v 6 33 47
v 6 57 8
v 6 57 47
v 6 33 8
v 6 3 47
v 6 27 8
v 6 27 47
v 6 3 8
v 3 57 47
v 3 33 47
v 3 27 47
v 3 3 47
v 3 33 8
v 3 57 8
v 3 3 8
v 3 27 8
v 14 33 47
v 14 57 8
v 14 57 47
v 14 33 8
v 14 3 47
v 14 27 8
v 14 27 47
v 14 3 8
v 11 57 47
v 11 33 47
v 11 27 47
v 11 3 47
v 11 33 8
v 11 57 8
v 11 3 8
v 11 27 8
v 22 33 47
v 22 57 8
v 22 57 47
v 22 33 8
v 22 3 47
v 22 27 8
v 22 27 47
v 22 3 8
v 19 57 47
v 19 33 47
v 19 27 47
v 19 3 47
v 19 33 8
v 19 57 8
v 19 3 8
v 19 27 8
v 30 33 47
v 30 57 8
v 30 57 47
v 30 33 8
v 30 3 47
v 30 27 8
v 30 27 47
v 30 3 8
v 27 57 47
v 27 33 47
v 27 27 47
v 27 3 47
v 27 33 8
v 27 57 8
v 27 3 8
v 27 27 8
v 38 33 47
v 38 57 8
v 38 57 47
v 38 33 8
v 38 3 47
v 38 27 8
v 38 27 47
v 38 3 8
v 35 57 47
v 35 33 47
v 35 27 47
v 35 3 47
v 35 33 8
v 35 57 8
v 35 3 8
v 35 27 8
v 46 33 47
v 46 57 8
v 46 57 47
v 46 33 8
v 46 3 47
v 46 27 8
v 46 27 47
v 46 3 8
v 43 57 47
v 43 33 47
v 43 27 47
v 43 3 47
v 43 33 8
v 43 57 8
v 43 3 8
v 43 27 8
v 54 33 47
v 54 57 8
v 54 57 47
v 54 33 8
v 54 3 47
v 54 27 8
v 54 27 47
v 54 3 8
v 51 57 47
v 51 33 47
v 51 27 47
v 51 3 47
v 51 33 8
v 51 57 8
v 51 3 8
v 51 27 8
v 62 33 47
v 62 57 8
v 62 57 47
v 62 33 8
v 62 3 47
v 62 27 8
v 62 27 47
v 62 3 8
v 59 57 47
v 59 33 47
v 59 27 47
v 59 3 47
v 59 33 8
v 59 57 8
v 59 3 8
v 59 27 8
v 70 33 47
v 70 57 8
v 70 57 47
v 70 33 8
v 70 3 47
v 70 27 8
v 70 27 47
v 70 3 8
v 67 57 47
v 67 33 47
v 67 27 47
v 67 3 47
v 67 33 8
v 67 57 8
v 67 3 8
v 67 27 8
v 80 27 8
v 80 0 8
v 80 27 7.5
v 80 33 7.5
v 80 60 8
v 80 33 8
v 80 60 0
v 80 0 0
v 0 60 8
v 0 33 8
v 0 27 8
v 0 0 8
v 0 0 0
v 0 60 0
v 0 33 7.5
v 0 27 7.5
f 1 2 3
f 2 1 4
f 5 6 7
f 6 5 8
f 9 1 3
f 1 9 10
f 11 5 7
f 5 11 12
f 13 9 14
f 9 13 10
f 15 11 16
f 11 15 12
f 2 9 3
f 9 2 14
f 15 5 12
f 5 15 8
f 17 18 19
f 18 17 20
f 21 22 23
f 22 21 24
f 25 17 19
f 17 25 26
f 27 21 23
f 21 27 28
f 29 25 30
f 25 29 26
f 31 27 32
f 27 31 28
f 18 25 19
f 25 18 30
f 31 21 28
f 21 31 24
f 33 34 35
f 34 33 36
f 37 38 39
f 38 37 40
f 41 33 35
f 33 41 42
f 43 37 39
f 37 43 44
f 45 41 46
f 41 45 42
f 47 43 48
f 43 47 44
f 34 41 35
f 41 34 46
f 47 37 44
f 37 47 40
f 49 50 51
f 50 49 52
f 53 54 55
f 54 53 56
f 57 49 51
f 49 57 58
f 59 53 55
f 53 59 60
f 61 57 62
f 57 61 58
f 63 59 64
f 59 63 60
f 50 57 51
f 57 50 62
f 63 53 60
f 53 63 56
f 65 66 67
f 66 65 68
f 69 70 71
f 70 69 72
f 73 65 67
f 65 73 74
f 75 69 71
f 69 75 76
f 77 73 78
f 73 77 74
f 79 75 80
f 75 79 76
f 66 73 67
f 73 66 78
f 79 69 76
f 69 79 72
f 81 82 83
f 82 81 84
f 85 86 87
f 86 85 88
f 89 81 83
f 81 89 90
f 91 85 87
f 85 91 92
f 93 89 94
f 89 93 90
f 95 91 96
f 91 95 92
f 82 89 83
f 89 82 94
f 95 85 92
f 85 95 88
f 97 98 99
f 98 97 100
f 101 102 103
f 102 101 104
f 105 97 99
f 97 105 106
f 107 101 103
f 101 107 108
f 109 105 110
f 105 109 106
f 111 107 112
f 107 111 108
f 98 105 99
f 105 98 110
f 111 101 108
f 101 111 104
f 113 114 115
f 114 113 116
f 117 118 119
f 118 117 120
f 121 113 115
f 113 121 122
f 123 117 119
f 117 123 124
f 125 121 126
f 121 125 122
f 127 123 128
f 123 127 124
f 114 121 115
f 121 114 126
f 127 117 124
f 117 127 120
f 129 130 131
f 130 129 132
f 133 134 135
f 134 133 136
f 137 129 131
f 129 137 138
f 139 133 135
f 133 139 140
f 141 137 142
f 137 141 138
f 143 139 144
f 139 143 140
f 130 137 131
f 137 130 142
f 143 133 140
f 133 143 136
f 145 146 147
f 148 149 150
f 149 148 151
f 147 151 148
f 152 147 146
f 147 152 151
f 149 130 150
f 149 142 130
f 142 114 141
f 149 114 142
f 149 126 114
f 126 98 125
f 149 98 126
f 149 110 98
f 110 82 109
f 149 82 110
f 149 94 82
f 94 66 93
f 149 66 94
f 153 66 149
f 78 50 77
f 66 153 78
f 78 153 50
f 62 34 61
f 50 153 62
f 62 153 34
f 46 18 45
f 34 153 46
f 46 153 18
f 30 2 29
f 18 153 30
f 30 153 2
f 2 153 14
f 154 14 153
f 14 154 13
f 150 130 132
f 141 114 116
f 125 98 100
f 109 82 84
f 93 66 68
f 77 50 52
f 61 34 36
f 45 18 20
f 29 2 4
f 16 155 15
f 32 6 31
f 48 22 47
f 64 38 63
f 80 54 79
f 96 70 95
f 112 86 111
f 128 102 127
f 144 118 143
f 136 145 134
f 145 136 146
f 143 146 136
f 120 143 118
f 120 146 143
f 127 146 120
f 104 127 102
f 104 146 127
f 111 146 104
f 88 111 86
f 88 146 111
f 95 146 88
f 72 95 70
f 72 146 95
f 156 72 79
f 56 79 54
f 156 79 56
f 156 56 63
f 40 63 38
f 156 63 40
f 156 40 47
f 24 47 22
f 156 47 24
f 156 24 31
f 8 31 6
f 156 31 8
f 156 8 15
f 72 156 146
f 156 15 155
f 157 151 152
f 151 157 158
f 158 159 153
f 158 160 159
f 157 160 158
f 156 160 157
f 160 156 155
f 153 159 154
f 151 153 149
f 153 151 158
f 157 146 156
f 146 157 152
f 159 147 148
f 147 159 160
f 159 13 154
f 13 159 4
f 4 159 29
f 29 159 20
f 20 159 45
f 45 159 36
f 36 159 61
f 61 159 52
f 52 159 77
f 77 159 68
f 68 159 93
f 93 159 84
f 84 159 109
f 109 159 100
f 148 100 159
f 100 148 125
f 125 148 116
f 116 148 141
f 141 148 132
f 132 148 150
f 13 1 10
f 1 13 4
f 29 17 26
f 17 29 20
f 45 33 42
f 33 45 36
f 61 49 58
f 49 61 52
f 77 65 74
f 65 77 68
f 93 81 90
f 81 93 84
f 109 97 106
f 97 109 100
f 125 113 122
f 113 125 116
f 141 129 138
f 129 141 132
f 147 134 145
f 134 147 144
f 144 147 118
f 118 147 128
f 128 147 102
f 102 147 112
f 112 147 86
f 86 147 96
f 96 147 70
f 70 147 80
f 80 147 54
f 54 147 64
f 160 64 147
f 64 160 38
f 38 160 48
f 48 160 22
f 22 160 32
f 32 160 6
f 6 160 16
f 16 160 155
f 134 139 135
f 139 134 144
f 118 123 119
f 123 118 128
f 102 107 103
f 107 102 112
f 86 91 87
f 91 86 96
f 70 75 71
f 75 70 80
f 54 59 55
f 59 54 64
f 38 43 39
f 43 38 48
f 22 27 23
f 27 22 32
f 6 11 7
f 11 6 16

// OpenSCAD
$fn = 32;

// ----------------------------------------------------------------------
// Heatsink: slotted fin block
// ----------------------------------------------------------------------

// --- parameters (mm) ---
base_l = 80;              // base length, X
base_w = 60;              // base width, Y
base_t = 8;               // base plate thickness
fin_h = 40;               // fin height above the base
fin_t = 3;                // fin thickness
edge = 3;                 // margin from the base ends
pitch = 8;                // fin pitch
slot_w = 6;               // central slot width, Y
fit_tol = 0.02;           // tolerance for press fits, mm
free_tol = 0.2;           // tolerance for clearance fits, mm

n_fins = floor((base_l - 2 * edge - fin_t) / pitch) + 1;  // fin count
total_h = base_t + fin_h - 1;  // overall height

difference() {
union() {
  cube([base_l, base_w, base_t]);
  for (i = [0 : n_fins - 1])
    translate([edge + i * pitch, edge, base_t - 1])
      cube([fin_t, base_w - 2 * edge, fin_h]);
}
  translate([-1, base_w / 2 - slot_w / 2, base_t - 0.5])
    cube([base_l + 2, slot_w, fin_h + 2]);
}
